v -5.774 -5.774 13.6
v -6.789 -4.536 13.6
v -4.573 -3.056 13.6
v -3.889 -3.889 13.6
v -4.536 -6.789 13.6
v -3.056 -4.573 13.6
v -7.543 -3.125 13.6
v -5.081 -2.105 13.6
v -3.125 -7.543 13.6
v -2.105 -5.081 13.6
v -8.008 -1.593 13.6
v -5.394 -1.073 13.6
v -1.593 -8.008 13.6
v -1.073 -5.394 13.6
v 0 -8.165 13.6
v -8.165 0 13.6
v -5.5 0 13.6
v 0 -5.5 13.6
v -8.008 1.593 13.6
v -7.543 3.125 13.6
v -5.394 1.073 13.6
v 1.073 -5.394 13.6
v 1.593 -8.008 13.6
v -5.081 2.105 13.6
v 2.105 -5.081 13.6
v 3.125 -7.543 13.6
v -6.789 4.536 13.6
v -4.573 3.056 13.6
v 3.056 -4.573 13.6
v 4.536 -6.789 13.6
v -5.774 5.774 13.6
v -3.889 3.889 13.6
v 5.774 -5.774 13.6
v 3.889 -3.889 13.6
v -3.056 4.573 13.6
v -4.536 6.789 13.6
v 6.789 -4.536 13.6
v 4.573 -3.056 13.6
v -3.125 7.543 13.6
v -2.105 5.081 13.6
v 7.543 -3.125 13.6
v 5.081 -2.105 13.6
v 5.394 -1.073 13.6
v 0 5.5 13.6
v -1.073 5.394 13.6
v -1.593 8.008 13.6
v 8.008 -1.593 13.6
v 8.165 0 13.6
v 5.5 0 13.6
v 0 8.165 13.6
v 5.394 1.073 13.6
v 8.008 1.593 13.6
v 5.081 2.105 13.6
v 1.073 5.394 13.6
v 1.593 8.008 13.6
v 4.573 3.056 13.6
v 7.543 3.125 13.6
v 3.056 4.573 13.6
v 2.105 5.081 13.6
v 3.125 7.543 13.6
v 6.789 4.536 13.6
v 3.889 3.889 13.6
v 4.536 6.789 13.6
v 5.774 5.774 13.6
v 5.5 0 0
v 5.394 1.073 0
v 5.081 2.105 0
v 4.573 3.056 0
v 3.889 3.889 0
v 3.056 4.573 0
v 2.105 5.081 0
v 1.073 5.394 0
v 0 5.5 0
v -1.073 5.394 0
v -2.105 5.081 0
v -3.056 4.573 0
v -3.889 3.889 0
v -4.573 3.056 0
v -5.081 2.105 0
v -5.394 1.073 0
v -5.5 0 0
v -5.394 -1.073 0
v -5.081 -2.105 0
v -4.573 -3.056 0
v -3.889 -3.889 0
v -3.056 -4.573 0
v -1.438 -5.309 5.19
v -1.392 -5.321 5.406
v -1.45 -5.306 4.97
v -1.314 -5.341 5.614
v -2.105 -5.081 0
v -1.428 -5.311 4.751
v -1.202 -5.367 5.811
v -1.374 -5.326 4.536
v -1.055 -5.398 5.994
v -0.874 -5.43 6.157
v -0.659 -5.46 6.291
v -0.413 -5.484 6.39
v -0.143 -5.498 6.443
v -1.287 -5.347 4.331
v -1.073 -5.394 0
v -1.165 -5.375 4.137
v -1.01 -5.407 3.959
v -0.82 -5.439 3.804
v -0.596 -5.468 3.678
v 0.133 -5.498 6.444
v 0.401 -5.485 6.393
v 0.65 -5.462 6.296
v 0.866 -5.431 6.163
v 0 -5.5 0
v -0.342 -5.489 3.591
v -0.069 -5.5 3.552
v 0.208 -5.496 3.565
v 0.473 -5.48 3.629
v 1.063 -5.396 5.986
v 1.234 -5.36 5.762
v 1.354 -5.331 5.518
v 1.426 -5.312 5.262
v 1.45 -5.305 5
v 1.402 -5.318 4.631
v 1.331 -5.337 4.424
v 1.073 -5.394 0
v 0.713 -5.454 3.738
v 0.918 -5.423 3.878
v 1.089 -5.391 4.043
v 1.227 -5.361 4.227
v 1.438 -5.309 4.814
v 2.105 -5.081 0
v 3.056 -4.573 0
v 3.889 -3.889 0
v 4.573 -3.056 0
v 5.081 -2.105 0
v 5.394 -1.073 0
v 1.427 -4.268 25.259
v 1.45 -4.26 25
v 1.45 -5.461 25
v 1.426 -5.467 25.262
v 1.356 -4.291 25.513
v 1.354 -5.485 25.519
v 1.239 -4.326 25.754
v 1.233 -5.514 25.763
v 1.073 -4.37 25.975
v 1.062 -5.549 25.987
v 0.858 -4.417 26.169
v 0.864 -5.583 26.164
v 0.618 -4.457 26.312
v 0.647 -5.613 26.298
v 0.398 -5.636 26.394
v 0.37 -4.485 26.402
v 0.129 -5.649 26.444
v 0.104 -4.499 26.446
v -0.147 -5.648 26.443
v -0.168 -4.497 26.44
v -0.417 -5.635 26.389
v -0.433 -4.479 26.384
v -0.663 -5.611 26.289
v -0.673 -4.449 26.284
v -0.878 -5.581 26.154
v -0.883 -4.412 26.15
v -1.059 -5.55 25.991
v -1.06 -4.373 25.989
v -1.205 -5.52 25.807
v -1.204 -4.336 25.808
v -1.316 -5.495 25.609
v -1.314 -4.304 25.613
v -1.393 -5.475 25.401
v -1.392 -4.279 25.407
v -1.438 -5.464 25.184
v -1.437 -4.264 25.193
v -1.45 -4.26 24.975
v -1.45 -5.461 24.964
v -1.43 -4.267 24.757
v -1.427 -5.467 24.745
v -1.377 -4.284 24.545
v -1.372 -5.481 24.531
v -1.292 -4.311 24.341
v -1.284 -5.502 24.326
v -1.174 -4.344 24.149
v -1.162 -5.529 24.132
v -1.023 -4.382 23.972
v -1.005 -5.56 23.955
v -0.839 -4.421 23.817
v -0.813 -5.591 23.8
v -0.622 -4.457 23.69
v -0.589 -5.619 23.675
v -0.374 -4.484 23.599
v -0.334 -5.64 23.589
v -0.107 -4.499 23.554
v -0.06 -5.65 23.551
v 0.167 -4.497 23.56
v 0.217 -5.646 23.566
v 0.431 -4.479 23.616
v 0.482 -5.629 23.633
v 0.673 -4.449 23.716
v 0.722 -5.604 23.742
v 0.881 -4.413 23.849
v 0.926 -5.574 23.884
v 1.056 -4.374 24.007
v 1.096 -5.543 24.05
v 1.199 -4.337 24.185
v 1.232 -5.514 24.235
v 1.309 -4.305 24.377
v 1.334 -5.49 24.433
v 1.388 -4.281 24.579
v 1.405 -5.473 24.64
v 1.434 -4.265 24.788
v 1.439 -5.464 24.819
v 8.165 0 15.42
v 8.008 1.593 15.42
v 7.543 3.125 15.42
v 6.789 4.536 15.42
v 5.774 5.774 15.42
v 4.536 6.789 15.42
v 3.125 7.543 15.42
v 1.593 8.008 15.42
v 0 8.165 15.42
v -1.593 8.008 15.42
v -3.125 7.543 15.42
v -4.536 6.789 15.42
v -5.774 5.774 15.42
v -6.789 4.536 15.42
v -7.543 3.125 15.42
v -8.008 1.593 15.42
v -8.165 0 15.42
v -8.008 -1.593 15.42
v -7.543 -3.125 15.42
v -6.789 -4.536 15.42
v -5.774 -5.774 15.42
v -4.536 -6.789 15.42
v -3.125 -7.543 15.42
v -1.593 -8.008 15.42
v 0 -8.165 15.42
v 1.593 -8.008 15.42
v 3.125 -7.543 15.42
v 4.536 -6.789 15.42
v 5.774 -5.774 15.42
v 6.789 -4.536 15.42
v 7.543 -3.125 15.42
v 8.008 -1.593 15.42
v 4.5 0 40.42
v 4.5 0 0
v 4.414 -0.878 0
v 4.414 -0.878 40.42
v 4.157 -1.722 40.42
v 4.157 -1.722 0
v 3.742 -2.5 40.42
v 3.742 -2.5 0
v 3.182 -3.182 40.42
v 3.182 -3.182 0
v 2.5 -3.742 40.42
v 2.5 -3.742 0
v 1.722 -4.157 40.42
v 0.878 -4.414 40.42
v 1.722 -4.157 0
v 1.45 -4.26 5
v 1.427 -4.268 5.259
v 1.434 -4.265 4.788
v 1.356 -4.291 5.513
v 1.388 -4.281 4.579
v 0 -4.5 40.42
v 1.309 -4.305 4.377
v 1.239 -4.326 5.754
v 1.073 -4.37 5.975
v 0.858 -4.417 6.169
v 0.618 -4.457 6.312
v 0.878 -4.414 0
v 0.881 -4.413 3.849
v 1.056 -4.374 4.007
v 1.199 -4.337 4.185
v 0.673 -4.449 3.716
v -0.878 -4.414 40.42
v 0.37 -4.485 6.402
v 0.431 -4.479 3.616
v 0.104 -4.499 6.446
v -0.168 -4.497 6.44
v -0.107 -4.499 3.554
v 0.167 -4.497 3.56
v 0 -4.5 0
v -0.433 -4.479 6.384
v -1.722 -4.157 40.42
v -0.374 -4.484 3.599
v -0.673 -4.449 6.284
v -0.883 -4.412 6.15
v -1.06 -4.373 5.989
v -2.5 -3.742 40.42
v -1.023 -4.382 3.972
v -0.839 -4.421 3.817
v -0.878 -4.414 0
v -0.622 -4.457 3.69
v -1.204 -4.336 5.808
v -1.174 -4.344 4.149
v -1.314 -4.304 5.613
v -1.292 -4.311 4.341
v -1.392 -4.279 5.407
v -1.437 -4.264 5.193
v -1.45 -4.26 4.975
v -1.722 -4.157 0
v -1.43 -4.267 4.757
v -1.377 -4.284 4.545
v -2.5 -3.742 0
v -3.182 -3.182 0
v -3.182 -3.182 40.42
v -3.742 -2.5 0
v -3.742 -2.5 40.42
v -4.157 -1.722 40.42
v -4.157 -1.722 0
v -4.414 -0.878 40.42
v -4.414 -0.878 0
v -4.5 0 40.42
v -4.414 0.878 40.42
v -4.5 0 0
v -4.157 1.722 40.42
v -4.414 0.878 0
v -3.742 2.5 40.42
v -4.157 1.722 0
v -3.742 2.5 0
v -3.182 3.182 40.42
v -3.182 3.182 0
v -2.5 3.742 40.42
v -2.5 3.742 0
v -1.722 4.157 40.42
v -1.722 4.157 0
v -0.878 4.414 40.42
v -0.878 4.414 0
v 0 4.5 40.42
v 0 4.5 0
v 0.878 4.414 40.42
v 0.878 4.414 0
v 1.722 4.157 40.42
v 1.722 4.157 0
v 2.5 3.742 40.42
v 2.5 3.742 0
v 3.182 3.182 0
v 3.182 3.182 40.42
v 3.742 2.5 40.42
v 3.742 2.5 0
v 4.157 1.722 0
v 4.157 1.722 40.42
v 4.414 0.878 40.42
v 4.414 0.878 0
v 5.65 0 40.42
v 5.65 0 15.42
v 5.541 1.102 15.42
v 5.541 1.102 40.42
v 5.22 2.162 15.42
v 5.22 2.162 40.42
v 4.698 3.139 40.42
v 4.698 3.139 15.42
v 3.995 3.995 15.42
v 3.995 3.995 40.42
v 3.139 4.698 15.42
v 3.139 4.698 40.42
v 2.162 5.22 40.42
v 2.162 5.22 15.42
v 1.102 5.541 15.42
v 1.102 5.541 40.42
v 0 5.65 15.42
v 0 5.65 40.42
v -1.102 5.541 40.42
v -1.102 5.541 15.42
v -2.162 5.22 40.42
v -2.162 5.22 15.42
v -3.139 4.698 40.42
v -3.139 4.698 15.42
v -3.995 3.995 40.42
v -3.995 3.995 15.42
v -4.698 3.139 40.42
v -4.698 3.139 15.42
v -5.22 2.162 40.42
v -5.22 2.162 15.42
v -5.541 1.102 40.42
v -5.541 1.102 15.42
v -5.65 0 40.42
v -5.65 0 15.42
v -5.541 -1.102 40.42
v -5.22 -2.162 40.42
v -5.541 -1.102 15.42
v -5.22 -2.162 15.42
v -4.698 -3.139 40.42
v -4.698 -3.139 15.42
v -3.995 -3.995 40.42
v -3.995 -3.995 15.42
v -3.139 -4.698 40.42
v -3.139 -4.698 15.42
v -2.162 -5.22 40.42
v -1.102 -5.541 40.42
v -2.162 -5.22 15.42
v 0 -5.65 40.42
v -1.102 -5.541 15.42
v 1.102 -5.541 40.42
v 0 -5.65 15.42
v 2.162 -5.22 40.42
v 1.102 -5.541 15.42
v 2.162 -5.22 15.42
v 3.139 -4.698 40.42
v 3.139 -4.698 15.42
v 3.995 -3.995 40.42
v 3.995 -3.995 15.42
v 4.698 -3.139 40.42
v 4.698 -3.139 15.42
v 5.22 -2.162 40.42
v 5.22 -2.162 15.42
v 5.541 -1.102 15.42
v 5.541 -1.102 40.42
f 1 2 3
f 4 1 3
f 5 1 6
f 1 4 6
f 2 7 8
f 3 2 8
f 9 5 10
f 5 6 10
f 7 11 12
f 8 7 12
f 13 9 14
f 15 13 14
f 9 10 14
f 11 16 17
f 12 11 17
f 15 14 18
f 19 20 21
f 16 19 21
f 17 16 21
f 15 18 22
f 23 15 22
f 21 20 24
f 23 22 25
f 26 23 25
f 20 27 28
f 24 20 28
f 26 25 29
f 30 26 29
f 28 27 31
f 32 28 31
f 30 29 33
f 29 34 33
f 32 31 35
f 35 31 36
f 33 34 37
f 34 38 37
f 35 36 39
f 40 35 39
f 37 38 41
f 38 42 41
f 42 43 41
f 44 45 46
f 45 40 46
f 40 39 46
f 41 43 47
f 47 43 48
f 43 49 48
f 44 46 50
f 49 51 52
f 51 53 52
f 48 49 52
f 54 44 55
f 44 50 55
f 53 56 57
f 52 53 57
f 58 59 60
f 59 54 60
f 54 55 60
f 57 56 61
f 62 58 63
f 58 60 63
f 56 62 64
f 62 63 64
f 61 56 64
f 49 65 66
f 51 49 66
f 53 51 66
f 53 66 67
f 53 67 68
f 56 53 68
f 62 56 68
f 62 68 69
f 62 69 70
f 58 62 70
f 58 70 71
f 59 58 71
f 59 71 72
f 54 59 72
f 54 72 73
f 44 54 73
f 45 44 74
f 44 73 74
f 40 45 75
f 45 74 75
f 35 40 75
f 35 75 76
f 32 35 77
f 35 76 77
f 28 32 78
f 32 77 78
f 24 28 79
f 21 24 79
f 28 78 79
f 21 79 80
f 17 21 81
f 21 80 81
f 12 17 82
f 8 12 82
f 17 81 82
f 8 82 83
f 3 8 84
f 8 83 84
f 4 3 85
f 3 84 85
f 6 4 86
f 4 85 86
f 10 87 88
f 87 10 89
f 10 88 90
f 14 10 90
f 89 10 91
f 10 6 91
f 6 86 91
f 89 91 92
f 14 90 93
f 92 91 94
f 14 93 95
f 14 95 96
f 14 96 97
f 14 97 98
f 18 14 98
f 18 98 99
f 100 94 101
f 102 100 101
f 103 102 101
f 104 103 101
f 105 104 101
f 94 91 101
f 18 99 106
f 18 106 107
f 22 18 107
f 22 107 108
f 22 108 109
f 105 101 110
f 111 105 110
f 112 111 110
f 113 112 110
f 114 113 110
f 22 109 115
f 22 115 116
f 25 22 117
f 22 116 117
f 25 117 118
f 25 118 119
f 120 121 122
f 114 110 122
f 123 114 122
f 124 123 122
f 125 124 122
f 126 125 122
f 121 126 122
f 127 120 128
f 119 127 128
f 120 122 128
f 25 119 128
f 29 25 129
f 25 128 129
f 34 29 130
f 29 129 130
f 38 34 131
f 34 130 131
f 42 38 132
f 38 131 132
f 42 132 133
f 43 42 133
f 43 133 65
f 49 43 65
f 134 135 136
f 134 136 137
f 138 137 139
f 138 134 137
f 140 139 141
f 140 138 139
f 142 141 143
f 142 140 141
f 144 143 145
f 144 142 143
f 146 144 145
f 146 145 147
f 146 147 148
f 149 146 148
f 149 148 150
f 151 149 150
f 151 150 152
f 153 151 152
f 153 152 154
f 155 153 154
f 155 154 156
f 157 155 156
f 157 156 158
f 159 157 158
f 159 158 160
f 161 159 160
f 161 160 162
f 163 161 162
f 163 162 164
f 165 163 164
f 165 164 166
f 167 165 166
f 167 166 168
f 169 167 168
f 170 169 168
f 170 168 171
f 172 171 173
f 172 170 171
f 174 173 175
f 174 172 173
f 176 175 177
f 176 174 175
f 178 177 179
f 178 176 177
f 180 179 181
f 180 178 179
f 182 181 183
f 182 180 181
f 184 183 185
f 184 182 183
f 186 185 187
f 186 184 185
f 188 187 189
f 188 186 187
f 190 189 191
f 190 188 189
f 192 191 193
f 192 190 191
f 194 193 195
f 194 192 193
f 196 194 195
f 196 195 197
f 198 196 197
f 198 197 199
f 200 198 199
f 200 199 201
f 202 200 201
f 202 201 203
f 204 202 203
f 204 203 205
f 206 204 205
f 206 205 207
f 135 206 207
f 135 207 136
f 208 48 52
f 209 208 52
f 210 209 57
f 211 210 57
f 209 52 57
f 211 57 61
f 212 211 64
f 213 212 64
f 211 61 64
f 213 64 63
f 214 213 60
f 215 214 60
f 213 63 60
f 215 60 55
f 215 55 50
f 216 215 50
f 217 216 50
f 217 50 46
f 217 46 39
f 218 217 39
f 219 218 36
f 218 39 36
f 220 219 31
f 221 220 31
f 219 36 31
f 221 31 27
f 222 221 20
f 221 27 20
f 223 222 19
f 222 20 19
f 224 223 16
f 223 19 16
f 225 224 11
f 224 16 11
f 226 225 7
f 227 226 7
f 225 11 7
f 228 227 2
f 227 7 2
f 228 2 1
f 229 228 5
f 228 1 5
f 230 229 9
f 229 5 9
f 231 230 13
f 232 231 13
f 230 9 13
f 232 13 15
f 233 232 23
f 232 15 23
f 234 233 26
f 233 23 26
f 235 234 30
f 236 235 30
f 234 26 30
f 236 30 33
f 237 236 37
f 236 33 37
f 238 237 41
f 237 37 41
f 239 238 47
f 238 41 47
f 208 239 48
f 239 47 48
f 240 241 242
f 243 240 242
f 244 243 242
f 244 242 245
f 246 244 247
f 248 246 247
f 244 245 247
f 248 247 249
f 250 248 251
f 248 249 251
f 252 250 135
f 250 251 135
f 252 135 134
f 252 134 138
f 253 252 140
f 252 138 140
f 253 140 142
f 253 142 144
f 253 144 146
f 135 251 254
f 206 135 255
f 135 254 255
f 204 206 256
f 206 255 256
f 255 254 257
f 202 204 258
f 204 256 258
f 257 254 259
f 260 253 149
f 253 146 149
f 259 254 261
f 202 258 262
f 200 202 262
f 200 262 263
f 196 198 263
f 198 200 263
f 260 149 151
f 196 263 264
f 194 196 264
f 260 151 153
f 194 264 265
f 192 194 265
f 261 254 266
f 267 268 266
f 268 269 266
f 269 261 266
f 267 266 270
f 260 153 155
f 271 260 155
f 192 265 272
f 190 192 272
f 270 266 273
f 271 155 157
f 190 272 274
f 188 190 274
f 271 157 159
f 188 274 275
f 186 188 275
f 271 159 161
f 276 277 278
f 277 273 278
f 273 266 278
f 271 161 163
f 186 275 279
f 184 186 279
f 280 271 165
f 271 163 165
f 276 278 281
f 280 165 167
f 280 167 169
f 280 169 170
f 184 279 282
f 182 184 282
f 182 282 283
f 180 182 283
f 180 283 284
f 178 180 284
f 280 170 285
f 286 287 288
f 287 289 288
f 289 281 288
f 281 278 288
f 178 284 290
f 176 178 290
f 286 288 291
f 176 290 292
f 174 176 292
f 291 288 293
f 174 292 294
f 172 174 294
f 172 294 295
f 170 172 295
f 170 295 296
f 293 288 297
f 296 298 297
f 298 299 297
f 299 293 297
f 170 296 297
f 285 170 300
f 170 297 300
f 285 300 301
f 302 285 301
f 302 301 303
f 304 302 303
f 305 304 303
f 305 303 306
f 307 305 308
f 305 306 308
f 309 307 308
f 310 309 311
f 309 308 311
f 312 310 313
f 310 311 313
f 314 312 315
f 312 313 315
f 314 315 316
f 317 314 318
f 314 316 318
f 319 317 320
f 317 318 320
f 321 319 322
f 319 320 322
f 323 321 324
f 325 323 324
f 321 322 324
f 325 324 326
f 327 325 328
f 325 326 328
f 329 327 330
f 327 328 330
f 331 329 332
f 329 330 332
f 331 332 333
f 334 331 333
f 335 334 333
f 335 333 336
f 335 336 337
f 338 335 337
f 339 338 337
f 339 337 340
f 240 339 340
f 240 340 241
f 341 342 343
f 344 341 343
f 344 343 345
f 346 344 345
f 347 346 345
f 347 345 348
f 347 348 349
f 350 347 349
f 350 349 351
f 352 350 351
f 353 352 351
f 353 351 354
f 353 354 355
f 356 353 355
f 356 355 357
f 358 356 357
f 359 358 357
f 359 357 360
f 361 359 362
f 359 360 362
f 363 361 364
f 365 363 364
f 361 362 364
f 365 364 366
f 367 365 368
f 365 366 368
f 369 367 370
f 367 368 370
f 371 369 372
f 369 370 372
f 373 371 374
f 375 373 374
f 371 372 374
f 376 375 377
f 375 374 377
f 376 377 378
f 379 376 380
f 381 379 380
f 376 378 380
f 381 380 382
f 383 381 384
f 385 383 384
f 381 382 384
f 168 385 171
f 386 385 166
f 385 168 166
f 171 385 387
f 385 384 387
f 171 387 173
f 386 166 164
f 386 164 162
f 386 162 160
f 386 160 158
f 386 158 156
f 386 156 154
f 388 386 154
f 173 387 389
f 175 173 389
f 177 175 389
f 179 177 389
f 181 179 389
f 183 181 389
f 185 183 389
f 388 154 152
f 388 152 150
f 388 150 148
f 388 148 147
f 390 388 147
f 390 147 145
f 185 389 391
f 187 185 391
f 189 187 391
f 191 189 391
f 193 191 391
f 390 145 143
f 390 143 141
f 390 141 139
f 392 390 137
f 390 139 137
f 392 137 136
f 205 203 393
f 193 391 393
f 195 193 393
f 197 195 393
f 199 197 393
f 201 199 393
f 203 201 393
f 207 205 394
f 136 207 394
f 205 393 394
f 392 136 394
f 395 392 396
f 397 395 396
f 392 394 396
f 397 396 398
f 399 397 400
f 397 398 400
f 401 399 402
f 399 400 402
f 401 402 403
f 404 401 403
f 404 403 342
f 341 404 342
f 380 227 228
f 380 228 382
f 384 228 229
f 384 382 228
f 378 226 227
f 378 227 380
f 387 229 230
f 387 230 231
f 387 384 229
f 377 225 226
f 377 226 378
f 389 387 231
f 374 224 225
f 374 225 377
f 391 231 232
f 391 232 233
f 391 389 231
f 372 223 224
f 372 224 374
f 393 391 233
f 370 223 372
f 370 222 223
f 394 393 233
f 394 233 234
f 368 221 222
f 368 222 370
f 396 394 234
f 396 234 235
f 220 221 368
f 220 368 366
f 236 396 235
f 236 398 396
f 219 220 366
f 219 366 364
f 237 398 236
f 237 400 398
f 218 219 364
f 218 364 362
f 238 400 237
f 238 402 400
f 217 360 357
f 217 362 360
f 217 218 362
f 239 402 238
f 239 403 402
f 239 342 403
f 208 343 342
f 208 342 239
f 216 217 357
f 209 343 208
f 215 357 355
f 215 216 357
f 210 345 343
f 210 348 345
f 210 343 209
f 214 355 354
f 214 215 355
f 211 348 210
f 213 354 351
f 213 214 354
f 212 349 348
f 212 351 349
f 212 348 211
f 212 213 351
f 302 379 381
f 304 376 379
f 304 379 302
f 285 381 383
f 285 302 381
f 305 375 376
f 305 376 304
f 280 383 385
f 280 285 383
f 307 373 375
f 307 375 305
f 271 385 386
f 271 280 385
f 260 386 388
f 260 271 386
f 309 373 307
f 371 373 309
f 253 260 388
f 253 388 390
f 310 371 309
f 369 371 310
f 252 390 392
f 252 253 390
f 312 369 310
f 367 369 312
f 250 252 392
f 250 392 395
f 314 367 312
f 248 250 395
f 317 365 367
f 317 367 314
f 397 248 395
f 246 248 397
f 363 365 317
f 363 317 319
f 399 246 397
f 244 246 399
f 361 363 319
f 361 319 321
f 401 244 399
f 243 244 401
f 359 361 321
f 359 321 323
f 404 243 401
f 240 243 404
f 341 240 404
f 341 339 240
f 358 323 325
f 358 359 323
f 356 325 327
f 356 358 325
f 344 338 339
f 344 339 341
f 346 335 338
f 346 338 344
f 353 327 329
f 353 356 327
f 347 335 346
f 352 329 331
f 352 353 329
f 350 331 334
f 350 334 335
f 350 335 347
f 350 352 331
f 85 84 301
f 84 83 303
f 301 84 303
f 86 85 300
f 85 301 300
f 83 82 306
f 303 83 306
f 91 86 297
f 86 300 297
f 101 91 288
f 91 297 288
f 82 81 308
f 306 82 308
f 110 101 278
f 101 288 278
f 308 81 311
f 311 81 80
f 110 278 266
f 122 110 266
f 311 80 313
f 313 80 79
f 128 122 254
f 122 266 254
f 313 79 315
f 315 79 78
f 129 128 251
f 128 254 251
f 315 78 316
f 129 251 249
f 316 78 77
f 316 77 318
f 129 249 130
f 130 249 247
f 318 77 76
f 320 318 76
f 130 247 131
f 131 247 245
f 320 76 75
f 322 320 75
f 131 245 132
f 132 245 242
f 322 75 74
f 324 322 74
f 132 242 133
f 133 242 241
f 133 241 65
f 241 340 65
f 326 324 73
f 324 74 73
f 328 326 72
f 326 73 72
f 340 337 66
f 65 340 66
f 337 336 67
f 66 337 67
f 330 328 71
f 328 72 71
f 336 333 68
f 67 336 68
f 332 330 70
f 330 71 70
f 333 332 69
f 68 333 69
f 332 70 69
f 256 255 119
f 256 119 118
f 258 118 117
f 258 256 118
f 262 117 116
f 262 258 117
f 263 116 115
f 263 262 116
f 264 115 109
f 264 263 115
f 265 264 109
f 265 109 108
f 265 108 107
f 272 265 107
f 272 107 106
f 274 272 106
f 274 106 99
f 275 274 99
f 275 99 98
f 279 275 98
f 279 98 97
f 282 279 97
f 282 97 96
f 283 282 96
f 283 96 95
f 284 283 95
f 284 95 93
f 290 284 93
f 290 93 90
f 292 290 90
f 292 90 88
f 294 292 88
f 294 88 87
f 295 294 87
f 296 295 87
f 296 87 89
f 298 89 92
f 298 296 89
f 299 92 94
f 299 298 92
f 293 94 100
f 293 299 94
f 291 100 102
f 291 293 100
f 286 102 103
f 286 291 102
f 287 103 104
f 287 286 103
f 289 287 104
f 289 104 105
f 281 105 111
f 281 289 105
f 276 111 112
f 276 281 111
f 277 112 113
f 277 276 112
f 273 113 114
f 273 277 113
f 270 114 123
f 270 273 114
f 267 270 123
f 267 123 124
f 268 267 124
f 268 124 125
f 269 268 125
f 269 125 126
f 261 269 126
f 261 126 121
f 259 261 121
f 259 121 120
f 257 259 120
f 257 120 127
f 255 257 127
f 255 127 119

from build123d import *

# Parameters (mm, degrees)
F0_R     = 5.5
F1_DEPTH = 13.6
F2_R     = 8.165
F3_DEPTH = 1.82
F4_R     = 5.65
F5_DEPTH = 25
F6_R     = 4.5
F7_DEPTH = 40.421
F8_R     = 1.45
F9_DEPTH = 12


with BuildPart() as f1:
    # F0 (on Top) → F1 (new body)
    with BuildSketch(Plane.XY):
        Circle(F0_R)
    extrude(amount=F1_DEPTH)

    # F2 (on face) → F3 (join)
    with BuildSketch(Plane.XY.offset(13.6)):
        Circle(F2_R)
    extrude(amount=F3_DEPTH)

    # F4 (on face) → F5 (join)
    with BuildSketch(Plane.XY.offset(15.42)):
        Circle(F4_R)
    extrude(amount=F5_DEPTH)

    # F6 (on face) → F7 (cut, through all)
    with BuildSketch(Plane(origin=(0, 0, 0), x_dir=(1, 0, 0), z_dir=(0, 0, -1))):
        Circle(F6_R)
    extrude(amount=-F7_DEPTH, mode=Mode.SUBTRACT)

    # F8 (on Front) → F9 (cut)
    with BuildSketch(Plane.XZ):
        with Locations((0, 25)):
            Circle(F8_R)
        with Locations((0, 5)):
            Circle(F8_R)
    extrude(amount=F9_DEPTH, mode=Mode.SUBTRACT)


solid = f1.part
